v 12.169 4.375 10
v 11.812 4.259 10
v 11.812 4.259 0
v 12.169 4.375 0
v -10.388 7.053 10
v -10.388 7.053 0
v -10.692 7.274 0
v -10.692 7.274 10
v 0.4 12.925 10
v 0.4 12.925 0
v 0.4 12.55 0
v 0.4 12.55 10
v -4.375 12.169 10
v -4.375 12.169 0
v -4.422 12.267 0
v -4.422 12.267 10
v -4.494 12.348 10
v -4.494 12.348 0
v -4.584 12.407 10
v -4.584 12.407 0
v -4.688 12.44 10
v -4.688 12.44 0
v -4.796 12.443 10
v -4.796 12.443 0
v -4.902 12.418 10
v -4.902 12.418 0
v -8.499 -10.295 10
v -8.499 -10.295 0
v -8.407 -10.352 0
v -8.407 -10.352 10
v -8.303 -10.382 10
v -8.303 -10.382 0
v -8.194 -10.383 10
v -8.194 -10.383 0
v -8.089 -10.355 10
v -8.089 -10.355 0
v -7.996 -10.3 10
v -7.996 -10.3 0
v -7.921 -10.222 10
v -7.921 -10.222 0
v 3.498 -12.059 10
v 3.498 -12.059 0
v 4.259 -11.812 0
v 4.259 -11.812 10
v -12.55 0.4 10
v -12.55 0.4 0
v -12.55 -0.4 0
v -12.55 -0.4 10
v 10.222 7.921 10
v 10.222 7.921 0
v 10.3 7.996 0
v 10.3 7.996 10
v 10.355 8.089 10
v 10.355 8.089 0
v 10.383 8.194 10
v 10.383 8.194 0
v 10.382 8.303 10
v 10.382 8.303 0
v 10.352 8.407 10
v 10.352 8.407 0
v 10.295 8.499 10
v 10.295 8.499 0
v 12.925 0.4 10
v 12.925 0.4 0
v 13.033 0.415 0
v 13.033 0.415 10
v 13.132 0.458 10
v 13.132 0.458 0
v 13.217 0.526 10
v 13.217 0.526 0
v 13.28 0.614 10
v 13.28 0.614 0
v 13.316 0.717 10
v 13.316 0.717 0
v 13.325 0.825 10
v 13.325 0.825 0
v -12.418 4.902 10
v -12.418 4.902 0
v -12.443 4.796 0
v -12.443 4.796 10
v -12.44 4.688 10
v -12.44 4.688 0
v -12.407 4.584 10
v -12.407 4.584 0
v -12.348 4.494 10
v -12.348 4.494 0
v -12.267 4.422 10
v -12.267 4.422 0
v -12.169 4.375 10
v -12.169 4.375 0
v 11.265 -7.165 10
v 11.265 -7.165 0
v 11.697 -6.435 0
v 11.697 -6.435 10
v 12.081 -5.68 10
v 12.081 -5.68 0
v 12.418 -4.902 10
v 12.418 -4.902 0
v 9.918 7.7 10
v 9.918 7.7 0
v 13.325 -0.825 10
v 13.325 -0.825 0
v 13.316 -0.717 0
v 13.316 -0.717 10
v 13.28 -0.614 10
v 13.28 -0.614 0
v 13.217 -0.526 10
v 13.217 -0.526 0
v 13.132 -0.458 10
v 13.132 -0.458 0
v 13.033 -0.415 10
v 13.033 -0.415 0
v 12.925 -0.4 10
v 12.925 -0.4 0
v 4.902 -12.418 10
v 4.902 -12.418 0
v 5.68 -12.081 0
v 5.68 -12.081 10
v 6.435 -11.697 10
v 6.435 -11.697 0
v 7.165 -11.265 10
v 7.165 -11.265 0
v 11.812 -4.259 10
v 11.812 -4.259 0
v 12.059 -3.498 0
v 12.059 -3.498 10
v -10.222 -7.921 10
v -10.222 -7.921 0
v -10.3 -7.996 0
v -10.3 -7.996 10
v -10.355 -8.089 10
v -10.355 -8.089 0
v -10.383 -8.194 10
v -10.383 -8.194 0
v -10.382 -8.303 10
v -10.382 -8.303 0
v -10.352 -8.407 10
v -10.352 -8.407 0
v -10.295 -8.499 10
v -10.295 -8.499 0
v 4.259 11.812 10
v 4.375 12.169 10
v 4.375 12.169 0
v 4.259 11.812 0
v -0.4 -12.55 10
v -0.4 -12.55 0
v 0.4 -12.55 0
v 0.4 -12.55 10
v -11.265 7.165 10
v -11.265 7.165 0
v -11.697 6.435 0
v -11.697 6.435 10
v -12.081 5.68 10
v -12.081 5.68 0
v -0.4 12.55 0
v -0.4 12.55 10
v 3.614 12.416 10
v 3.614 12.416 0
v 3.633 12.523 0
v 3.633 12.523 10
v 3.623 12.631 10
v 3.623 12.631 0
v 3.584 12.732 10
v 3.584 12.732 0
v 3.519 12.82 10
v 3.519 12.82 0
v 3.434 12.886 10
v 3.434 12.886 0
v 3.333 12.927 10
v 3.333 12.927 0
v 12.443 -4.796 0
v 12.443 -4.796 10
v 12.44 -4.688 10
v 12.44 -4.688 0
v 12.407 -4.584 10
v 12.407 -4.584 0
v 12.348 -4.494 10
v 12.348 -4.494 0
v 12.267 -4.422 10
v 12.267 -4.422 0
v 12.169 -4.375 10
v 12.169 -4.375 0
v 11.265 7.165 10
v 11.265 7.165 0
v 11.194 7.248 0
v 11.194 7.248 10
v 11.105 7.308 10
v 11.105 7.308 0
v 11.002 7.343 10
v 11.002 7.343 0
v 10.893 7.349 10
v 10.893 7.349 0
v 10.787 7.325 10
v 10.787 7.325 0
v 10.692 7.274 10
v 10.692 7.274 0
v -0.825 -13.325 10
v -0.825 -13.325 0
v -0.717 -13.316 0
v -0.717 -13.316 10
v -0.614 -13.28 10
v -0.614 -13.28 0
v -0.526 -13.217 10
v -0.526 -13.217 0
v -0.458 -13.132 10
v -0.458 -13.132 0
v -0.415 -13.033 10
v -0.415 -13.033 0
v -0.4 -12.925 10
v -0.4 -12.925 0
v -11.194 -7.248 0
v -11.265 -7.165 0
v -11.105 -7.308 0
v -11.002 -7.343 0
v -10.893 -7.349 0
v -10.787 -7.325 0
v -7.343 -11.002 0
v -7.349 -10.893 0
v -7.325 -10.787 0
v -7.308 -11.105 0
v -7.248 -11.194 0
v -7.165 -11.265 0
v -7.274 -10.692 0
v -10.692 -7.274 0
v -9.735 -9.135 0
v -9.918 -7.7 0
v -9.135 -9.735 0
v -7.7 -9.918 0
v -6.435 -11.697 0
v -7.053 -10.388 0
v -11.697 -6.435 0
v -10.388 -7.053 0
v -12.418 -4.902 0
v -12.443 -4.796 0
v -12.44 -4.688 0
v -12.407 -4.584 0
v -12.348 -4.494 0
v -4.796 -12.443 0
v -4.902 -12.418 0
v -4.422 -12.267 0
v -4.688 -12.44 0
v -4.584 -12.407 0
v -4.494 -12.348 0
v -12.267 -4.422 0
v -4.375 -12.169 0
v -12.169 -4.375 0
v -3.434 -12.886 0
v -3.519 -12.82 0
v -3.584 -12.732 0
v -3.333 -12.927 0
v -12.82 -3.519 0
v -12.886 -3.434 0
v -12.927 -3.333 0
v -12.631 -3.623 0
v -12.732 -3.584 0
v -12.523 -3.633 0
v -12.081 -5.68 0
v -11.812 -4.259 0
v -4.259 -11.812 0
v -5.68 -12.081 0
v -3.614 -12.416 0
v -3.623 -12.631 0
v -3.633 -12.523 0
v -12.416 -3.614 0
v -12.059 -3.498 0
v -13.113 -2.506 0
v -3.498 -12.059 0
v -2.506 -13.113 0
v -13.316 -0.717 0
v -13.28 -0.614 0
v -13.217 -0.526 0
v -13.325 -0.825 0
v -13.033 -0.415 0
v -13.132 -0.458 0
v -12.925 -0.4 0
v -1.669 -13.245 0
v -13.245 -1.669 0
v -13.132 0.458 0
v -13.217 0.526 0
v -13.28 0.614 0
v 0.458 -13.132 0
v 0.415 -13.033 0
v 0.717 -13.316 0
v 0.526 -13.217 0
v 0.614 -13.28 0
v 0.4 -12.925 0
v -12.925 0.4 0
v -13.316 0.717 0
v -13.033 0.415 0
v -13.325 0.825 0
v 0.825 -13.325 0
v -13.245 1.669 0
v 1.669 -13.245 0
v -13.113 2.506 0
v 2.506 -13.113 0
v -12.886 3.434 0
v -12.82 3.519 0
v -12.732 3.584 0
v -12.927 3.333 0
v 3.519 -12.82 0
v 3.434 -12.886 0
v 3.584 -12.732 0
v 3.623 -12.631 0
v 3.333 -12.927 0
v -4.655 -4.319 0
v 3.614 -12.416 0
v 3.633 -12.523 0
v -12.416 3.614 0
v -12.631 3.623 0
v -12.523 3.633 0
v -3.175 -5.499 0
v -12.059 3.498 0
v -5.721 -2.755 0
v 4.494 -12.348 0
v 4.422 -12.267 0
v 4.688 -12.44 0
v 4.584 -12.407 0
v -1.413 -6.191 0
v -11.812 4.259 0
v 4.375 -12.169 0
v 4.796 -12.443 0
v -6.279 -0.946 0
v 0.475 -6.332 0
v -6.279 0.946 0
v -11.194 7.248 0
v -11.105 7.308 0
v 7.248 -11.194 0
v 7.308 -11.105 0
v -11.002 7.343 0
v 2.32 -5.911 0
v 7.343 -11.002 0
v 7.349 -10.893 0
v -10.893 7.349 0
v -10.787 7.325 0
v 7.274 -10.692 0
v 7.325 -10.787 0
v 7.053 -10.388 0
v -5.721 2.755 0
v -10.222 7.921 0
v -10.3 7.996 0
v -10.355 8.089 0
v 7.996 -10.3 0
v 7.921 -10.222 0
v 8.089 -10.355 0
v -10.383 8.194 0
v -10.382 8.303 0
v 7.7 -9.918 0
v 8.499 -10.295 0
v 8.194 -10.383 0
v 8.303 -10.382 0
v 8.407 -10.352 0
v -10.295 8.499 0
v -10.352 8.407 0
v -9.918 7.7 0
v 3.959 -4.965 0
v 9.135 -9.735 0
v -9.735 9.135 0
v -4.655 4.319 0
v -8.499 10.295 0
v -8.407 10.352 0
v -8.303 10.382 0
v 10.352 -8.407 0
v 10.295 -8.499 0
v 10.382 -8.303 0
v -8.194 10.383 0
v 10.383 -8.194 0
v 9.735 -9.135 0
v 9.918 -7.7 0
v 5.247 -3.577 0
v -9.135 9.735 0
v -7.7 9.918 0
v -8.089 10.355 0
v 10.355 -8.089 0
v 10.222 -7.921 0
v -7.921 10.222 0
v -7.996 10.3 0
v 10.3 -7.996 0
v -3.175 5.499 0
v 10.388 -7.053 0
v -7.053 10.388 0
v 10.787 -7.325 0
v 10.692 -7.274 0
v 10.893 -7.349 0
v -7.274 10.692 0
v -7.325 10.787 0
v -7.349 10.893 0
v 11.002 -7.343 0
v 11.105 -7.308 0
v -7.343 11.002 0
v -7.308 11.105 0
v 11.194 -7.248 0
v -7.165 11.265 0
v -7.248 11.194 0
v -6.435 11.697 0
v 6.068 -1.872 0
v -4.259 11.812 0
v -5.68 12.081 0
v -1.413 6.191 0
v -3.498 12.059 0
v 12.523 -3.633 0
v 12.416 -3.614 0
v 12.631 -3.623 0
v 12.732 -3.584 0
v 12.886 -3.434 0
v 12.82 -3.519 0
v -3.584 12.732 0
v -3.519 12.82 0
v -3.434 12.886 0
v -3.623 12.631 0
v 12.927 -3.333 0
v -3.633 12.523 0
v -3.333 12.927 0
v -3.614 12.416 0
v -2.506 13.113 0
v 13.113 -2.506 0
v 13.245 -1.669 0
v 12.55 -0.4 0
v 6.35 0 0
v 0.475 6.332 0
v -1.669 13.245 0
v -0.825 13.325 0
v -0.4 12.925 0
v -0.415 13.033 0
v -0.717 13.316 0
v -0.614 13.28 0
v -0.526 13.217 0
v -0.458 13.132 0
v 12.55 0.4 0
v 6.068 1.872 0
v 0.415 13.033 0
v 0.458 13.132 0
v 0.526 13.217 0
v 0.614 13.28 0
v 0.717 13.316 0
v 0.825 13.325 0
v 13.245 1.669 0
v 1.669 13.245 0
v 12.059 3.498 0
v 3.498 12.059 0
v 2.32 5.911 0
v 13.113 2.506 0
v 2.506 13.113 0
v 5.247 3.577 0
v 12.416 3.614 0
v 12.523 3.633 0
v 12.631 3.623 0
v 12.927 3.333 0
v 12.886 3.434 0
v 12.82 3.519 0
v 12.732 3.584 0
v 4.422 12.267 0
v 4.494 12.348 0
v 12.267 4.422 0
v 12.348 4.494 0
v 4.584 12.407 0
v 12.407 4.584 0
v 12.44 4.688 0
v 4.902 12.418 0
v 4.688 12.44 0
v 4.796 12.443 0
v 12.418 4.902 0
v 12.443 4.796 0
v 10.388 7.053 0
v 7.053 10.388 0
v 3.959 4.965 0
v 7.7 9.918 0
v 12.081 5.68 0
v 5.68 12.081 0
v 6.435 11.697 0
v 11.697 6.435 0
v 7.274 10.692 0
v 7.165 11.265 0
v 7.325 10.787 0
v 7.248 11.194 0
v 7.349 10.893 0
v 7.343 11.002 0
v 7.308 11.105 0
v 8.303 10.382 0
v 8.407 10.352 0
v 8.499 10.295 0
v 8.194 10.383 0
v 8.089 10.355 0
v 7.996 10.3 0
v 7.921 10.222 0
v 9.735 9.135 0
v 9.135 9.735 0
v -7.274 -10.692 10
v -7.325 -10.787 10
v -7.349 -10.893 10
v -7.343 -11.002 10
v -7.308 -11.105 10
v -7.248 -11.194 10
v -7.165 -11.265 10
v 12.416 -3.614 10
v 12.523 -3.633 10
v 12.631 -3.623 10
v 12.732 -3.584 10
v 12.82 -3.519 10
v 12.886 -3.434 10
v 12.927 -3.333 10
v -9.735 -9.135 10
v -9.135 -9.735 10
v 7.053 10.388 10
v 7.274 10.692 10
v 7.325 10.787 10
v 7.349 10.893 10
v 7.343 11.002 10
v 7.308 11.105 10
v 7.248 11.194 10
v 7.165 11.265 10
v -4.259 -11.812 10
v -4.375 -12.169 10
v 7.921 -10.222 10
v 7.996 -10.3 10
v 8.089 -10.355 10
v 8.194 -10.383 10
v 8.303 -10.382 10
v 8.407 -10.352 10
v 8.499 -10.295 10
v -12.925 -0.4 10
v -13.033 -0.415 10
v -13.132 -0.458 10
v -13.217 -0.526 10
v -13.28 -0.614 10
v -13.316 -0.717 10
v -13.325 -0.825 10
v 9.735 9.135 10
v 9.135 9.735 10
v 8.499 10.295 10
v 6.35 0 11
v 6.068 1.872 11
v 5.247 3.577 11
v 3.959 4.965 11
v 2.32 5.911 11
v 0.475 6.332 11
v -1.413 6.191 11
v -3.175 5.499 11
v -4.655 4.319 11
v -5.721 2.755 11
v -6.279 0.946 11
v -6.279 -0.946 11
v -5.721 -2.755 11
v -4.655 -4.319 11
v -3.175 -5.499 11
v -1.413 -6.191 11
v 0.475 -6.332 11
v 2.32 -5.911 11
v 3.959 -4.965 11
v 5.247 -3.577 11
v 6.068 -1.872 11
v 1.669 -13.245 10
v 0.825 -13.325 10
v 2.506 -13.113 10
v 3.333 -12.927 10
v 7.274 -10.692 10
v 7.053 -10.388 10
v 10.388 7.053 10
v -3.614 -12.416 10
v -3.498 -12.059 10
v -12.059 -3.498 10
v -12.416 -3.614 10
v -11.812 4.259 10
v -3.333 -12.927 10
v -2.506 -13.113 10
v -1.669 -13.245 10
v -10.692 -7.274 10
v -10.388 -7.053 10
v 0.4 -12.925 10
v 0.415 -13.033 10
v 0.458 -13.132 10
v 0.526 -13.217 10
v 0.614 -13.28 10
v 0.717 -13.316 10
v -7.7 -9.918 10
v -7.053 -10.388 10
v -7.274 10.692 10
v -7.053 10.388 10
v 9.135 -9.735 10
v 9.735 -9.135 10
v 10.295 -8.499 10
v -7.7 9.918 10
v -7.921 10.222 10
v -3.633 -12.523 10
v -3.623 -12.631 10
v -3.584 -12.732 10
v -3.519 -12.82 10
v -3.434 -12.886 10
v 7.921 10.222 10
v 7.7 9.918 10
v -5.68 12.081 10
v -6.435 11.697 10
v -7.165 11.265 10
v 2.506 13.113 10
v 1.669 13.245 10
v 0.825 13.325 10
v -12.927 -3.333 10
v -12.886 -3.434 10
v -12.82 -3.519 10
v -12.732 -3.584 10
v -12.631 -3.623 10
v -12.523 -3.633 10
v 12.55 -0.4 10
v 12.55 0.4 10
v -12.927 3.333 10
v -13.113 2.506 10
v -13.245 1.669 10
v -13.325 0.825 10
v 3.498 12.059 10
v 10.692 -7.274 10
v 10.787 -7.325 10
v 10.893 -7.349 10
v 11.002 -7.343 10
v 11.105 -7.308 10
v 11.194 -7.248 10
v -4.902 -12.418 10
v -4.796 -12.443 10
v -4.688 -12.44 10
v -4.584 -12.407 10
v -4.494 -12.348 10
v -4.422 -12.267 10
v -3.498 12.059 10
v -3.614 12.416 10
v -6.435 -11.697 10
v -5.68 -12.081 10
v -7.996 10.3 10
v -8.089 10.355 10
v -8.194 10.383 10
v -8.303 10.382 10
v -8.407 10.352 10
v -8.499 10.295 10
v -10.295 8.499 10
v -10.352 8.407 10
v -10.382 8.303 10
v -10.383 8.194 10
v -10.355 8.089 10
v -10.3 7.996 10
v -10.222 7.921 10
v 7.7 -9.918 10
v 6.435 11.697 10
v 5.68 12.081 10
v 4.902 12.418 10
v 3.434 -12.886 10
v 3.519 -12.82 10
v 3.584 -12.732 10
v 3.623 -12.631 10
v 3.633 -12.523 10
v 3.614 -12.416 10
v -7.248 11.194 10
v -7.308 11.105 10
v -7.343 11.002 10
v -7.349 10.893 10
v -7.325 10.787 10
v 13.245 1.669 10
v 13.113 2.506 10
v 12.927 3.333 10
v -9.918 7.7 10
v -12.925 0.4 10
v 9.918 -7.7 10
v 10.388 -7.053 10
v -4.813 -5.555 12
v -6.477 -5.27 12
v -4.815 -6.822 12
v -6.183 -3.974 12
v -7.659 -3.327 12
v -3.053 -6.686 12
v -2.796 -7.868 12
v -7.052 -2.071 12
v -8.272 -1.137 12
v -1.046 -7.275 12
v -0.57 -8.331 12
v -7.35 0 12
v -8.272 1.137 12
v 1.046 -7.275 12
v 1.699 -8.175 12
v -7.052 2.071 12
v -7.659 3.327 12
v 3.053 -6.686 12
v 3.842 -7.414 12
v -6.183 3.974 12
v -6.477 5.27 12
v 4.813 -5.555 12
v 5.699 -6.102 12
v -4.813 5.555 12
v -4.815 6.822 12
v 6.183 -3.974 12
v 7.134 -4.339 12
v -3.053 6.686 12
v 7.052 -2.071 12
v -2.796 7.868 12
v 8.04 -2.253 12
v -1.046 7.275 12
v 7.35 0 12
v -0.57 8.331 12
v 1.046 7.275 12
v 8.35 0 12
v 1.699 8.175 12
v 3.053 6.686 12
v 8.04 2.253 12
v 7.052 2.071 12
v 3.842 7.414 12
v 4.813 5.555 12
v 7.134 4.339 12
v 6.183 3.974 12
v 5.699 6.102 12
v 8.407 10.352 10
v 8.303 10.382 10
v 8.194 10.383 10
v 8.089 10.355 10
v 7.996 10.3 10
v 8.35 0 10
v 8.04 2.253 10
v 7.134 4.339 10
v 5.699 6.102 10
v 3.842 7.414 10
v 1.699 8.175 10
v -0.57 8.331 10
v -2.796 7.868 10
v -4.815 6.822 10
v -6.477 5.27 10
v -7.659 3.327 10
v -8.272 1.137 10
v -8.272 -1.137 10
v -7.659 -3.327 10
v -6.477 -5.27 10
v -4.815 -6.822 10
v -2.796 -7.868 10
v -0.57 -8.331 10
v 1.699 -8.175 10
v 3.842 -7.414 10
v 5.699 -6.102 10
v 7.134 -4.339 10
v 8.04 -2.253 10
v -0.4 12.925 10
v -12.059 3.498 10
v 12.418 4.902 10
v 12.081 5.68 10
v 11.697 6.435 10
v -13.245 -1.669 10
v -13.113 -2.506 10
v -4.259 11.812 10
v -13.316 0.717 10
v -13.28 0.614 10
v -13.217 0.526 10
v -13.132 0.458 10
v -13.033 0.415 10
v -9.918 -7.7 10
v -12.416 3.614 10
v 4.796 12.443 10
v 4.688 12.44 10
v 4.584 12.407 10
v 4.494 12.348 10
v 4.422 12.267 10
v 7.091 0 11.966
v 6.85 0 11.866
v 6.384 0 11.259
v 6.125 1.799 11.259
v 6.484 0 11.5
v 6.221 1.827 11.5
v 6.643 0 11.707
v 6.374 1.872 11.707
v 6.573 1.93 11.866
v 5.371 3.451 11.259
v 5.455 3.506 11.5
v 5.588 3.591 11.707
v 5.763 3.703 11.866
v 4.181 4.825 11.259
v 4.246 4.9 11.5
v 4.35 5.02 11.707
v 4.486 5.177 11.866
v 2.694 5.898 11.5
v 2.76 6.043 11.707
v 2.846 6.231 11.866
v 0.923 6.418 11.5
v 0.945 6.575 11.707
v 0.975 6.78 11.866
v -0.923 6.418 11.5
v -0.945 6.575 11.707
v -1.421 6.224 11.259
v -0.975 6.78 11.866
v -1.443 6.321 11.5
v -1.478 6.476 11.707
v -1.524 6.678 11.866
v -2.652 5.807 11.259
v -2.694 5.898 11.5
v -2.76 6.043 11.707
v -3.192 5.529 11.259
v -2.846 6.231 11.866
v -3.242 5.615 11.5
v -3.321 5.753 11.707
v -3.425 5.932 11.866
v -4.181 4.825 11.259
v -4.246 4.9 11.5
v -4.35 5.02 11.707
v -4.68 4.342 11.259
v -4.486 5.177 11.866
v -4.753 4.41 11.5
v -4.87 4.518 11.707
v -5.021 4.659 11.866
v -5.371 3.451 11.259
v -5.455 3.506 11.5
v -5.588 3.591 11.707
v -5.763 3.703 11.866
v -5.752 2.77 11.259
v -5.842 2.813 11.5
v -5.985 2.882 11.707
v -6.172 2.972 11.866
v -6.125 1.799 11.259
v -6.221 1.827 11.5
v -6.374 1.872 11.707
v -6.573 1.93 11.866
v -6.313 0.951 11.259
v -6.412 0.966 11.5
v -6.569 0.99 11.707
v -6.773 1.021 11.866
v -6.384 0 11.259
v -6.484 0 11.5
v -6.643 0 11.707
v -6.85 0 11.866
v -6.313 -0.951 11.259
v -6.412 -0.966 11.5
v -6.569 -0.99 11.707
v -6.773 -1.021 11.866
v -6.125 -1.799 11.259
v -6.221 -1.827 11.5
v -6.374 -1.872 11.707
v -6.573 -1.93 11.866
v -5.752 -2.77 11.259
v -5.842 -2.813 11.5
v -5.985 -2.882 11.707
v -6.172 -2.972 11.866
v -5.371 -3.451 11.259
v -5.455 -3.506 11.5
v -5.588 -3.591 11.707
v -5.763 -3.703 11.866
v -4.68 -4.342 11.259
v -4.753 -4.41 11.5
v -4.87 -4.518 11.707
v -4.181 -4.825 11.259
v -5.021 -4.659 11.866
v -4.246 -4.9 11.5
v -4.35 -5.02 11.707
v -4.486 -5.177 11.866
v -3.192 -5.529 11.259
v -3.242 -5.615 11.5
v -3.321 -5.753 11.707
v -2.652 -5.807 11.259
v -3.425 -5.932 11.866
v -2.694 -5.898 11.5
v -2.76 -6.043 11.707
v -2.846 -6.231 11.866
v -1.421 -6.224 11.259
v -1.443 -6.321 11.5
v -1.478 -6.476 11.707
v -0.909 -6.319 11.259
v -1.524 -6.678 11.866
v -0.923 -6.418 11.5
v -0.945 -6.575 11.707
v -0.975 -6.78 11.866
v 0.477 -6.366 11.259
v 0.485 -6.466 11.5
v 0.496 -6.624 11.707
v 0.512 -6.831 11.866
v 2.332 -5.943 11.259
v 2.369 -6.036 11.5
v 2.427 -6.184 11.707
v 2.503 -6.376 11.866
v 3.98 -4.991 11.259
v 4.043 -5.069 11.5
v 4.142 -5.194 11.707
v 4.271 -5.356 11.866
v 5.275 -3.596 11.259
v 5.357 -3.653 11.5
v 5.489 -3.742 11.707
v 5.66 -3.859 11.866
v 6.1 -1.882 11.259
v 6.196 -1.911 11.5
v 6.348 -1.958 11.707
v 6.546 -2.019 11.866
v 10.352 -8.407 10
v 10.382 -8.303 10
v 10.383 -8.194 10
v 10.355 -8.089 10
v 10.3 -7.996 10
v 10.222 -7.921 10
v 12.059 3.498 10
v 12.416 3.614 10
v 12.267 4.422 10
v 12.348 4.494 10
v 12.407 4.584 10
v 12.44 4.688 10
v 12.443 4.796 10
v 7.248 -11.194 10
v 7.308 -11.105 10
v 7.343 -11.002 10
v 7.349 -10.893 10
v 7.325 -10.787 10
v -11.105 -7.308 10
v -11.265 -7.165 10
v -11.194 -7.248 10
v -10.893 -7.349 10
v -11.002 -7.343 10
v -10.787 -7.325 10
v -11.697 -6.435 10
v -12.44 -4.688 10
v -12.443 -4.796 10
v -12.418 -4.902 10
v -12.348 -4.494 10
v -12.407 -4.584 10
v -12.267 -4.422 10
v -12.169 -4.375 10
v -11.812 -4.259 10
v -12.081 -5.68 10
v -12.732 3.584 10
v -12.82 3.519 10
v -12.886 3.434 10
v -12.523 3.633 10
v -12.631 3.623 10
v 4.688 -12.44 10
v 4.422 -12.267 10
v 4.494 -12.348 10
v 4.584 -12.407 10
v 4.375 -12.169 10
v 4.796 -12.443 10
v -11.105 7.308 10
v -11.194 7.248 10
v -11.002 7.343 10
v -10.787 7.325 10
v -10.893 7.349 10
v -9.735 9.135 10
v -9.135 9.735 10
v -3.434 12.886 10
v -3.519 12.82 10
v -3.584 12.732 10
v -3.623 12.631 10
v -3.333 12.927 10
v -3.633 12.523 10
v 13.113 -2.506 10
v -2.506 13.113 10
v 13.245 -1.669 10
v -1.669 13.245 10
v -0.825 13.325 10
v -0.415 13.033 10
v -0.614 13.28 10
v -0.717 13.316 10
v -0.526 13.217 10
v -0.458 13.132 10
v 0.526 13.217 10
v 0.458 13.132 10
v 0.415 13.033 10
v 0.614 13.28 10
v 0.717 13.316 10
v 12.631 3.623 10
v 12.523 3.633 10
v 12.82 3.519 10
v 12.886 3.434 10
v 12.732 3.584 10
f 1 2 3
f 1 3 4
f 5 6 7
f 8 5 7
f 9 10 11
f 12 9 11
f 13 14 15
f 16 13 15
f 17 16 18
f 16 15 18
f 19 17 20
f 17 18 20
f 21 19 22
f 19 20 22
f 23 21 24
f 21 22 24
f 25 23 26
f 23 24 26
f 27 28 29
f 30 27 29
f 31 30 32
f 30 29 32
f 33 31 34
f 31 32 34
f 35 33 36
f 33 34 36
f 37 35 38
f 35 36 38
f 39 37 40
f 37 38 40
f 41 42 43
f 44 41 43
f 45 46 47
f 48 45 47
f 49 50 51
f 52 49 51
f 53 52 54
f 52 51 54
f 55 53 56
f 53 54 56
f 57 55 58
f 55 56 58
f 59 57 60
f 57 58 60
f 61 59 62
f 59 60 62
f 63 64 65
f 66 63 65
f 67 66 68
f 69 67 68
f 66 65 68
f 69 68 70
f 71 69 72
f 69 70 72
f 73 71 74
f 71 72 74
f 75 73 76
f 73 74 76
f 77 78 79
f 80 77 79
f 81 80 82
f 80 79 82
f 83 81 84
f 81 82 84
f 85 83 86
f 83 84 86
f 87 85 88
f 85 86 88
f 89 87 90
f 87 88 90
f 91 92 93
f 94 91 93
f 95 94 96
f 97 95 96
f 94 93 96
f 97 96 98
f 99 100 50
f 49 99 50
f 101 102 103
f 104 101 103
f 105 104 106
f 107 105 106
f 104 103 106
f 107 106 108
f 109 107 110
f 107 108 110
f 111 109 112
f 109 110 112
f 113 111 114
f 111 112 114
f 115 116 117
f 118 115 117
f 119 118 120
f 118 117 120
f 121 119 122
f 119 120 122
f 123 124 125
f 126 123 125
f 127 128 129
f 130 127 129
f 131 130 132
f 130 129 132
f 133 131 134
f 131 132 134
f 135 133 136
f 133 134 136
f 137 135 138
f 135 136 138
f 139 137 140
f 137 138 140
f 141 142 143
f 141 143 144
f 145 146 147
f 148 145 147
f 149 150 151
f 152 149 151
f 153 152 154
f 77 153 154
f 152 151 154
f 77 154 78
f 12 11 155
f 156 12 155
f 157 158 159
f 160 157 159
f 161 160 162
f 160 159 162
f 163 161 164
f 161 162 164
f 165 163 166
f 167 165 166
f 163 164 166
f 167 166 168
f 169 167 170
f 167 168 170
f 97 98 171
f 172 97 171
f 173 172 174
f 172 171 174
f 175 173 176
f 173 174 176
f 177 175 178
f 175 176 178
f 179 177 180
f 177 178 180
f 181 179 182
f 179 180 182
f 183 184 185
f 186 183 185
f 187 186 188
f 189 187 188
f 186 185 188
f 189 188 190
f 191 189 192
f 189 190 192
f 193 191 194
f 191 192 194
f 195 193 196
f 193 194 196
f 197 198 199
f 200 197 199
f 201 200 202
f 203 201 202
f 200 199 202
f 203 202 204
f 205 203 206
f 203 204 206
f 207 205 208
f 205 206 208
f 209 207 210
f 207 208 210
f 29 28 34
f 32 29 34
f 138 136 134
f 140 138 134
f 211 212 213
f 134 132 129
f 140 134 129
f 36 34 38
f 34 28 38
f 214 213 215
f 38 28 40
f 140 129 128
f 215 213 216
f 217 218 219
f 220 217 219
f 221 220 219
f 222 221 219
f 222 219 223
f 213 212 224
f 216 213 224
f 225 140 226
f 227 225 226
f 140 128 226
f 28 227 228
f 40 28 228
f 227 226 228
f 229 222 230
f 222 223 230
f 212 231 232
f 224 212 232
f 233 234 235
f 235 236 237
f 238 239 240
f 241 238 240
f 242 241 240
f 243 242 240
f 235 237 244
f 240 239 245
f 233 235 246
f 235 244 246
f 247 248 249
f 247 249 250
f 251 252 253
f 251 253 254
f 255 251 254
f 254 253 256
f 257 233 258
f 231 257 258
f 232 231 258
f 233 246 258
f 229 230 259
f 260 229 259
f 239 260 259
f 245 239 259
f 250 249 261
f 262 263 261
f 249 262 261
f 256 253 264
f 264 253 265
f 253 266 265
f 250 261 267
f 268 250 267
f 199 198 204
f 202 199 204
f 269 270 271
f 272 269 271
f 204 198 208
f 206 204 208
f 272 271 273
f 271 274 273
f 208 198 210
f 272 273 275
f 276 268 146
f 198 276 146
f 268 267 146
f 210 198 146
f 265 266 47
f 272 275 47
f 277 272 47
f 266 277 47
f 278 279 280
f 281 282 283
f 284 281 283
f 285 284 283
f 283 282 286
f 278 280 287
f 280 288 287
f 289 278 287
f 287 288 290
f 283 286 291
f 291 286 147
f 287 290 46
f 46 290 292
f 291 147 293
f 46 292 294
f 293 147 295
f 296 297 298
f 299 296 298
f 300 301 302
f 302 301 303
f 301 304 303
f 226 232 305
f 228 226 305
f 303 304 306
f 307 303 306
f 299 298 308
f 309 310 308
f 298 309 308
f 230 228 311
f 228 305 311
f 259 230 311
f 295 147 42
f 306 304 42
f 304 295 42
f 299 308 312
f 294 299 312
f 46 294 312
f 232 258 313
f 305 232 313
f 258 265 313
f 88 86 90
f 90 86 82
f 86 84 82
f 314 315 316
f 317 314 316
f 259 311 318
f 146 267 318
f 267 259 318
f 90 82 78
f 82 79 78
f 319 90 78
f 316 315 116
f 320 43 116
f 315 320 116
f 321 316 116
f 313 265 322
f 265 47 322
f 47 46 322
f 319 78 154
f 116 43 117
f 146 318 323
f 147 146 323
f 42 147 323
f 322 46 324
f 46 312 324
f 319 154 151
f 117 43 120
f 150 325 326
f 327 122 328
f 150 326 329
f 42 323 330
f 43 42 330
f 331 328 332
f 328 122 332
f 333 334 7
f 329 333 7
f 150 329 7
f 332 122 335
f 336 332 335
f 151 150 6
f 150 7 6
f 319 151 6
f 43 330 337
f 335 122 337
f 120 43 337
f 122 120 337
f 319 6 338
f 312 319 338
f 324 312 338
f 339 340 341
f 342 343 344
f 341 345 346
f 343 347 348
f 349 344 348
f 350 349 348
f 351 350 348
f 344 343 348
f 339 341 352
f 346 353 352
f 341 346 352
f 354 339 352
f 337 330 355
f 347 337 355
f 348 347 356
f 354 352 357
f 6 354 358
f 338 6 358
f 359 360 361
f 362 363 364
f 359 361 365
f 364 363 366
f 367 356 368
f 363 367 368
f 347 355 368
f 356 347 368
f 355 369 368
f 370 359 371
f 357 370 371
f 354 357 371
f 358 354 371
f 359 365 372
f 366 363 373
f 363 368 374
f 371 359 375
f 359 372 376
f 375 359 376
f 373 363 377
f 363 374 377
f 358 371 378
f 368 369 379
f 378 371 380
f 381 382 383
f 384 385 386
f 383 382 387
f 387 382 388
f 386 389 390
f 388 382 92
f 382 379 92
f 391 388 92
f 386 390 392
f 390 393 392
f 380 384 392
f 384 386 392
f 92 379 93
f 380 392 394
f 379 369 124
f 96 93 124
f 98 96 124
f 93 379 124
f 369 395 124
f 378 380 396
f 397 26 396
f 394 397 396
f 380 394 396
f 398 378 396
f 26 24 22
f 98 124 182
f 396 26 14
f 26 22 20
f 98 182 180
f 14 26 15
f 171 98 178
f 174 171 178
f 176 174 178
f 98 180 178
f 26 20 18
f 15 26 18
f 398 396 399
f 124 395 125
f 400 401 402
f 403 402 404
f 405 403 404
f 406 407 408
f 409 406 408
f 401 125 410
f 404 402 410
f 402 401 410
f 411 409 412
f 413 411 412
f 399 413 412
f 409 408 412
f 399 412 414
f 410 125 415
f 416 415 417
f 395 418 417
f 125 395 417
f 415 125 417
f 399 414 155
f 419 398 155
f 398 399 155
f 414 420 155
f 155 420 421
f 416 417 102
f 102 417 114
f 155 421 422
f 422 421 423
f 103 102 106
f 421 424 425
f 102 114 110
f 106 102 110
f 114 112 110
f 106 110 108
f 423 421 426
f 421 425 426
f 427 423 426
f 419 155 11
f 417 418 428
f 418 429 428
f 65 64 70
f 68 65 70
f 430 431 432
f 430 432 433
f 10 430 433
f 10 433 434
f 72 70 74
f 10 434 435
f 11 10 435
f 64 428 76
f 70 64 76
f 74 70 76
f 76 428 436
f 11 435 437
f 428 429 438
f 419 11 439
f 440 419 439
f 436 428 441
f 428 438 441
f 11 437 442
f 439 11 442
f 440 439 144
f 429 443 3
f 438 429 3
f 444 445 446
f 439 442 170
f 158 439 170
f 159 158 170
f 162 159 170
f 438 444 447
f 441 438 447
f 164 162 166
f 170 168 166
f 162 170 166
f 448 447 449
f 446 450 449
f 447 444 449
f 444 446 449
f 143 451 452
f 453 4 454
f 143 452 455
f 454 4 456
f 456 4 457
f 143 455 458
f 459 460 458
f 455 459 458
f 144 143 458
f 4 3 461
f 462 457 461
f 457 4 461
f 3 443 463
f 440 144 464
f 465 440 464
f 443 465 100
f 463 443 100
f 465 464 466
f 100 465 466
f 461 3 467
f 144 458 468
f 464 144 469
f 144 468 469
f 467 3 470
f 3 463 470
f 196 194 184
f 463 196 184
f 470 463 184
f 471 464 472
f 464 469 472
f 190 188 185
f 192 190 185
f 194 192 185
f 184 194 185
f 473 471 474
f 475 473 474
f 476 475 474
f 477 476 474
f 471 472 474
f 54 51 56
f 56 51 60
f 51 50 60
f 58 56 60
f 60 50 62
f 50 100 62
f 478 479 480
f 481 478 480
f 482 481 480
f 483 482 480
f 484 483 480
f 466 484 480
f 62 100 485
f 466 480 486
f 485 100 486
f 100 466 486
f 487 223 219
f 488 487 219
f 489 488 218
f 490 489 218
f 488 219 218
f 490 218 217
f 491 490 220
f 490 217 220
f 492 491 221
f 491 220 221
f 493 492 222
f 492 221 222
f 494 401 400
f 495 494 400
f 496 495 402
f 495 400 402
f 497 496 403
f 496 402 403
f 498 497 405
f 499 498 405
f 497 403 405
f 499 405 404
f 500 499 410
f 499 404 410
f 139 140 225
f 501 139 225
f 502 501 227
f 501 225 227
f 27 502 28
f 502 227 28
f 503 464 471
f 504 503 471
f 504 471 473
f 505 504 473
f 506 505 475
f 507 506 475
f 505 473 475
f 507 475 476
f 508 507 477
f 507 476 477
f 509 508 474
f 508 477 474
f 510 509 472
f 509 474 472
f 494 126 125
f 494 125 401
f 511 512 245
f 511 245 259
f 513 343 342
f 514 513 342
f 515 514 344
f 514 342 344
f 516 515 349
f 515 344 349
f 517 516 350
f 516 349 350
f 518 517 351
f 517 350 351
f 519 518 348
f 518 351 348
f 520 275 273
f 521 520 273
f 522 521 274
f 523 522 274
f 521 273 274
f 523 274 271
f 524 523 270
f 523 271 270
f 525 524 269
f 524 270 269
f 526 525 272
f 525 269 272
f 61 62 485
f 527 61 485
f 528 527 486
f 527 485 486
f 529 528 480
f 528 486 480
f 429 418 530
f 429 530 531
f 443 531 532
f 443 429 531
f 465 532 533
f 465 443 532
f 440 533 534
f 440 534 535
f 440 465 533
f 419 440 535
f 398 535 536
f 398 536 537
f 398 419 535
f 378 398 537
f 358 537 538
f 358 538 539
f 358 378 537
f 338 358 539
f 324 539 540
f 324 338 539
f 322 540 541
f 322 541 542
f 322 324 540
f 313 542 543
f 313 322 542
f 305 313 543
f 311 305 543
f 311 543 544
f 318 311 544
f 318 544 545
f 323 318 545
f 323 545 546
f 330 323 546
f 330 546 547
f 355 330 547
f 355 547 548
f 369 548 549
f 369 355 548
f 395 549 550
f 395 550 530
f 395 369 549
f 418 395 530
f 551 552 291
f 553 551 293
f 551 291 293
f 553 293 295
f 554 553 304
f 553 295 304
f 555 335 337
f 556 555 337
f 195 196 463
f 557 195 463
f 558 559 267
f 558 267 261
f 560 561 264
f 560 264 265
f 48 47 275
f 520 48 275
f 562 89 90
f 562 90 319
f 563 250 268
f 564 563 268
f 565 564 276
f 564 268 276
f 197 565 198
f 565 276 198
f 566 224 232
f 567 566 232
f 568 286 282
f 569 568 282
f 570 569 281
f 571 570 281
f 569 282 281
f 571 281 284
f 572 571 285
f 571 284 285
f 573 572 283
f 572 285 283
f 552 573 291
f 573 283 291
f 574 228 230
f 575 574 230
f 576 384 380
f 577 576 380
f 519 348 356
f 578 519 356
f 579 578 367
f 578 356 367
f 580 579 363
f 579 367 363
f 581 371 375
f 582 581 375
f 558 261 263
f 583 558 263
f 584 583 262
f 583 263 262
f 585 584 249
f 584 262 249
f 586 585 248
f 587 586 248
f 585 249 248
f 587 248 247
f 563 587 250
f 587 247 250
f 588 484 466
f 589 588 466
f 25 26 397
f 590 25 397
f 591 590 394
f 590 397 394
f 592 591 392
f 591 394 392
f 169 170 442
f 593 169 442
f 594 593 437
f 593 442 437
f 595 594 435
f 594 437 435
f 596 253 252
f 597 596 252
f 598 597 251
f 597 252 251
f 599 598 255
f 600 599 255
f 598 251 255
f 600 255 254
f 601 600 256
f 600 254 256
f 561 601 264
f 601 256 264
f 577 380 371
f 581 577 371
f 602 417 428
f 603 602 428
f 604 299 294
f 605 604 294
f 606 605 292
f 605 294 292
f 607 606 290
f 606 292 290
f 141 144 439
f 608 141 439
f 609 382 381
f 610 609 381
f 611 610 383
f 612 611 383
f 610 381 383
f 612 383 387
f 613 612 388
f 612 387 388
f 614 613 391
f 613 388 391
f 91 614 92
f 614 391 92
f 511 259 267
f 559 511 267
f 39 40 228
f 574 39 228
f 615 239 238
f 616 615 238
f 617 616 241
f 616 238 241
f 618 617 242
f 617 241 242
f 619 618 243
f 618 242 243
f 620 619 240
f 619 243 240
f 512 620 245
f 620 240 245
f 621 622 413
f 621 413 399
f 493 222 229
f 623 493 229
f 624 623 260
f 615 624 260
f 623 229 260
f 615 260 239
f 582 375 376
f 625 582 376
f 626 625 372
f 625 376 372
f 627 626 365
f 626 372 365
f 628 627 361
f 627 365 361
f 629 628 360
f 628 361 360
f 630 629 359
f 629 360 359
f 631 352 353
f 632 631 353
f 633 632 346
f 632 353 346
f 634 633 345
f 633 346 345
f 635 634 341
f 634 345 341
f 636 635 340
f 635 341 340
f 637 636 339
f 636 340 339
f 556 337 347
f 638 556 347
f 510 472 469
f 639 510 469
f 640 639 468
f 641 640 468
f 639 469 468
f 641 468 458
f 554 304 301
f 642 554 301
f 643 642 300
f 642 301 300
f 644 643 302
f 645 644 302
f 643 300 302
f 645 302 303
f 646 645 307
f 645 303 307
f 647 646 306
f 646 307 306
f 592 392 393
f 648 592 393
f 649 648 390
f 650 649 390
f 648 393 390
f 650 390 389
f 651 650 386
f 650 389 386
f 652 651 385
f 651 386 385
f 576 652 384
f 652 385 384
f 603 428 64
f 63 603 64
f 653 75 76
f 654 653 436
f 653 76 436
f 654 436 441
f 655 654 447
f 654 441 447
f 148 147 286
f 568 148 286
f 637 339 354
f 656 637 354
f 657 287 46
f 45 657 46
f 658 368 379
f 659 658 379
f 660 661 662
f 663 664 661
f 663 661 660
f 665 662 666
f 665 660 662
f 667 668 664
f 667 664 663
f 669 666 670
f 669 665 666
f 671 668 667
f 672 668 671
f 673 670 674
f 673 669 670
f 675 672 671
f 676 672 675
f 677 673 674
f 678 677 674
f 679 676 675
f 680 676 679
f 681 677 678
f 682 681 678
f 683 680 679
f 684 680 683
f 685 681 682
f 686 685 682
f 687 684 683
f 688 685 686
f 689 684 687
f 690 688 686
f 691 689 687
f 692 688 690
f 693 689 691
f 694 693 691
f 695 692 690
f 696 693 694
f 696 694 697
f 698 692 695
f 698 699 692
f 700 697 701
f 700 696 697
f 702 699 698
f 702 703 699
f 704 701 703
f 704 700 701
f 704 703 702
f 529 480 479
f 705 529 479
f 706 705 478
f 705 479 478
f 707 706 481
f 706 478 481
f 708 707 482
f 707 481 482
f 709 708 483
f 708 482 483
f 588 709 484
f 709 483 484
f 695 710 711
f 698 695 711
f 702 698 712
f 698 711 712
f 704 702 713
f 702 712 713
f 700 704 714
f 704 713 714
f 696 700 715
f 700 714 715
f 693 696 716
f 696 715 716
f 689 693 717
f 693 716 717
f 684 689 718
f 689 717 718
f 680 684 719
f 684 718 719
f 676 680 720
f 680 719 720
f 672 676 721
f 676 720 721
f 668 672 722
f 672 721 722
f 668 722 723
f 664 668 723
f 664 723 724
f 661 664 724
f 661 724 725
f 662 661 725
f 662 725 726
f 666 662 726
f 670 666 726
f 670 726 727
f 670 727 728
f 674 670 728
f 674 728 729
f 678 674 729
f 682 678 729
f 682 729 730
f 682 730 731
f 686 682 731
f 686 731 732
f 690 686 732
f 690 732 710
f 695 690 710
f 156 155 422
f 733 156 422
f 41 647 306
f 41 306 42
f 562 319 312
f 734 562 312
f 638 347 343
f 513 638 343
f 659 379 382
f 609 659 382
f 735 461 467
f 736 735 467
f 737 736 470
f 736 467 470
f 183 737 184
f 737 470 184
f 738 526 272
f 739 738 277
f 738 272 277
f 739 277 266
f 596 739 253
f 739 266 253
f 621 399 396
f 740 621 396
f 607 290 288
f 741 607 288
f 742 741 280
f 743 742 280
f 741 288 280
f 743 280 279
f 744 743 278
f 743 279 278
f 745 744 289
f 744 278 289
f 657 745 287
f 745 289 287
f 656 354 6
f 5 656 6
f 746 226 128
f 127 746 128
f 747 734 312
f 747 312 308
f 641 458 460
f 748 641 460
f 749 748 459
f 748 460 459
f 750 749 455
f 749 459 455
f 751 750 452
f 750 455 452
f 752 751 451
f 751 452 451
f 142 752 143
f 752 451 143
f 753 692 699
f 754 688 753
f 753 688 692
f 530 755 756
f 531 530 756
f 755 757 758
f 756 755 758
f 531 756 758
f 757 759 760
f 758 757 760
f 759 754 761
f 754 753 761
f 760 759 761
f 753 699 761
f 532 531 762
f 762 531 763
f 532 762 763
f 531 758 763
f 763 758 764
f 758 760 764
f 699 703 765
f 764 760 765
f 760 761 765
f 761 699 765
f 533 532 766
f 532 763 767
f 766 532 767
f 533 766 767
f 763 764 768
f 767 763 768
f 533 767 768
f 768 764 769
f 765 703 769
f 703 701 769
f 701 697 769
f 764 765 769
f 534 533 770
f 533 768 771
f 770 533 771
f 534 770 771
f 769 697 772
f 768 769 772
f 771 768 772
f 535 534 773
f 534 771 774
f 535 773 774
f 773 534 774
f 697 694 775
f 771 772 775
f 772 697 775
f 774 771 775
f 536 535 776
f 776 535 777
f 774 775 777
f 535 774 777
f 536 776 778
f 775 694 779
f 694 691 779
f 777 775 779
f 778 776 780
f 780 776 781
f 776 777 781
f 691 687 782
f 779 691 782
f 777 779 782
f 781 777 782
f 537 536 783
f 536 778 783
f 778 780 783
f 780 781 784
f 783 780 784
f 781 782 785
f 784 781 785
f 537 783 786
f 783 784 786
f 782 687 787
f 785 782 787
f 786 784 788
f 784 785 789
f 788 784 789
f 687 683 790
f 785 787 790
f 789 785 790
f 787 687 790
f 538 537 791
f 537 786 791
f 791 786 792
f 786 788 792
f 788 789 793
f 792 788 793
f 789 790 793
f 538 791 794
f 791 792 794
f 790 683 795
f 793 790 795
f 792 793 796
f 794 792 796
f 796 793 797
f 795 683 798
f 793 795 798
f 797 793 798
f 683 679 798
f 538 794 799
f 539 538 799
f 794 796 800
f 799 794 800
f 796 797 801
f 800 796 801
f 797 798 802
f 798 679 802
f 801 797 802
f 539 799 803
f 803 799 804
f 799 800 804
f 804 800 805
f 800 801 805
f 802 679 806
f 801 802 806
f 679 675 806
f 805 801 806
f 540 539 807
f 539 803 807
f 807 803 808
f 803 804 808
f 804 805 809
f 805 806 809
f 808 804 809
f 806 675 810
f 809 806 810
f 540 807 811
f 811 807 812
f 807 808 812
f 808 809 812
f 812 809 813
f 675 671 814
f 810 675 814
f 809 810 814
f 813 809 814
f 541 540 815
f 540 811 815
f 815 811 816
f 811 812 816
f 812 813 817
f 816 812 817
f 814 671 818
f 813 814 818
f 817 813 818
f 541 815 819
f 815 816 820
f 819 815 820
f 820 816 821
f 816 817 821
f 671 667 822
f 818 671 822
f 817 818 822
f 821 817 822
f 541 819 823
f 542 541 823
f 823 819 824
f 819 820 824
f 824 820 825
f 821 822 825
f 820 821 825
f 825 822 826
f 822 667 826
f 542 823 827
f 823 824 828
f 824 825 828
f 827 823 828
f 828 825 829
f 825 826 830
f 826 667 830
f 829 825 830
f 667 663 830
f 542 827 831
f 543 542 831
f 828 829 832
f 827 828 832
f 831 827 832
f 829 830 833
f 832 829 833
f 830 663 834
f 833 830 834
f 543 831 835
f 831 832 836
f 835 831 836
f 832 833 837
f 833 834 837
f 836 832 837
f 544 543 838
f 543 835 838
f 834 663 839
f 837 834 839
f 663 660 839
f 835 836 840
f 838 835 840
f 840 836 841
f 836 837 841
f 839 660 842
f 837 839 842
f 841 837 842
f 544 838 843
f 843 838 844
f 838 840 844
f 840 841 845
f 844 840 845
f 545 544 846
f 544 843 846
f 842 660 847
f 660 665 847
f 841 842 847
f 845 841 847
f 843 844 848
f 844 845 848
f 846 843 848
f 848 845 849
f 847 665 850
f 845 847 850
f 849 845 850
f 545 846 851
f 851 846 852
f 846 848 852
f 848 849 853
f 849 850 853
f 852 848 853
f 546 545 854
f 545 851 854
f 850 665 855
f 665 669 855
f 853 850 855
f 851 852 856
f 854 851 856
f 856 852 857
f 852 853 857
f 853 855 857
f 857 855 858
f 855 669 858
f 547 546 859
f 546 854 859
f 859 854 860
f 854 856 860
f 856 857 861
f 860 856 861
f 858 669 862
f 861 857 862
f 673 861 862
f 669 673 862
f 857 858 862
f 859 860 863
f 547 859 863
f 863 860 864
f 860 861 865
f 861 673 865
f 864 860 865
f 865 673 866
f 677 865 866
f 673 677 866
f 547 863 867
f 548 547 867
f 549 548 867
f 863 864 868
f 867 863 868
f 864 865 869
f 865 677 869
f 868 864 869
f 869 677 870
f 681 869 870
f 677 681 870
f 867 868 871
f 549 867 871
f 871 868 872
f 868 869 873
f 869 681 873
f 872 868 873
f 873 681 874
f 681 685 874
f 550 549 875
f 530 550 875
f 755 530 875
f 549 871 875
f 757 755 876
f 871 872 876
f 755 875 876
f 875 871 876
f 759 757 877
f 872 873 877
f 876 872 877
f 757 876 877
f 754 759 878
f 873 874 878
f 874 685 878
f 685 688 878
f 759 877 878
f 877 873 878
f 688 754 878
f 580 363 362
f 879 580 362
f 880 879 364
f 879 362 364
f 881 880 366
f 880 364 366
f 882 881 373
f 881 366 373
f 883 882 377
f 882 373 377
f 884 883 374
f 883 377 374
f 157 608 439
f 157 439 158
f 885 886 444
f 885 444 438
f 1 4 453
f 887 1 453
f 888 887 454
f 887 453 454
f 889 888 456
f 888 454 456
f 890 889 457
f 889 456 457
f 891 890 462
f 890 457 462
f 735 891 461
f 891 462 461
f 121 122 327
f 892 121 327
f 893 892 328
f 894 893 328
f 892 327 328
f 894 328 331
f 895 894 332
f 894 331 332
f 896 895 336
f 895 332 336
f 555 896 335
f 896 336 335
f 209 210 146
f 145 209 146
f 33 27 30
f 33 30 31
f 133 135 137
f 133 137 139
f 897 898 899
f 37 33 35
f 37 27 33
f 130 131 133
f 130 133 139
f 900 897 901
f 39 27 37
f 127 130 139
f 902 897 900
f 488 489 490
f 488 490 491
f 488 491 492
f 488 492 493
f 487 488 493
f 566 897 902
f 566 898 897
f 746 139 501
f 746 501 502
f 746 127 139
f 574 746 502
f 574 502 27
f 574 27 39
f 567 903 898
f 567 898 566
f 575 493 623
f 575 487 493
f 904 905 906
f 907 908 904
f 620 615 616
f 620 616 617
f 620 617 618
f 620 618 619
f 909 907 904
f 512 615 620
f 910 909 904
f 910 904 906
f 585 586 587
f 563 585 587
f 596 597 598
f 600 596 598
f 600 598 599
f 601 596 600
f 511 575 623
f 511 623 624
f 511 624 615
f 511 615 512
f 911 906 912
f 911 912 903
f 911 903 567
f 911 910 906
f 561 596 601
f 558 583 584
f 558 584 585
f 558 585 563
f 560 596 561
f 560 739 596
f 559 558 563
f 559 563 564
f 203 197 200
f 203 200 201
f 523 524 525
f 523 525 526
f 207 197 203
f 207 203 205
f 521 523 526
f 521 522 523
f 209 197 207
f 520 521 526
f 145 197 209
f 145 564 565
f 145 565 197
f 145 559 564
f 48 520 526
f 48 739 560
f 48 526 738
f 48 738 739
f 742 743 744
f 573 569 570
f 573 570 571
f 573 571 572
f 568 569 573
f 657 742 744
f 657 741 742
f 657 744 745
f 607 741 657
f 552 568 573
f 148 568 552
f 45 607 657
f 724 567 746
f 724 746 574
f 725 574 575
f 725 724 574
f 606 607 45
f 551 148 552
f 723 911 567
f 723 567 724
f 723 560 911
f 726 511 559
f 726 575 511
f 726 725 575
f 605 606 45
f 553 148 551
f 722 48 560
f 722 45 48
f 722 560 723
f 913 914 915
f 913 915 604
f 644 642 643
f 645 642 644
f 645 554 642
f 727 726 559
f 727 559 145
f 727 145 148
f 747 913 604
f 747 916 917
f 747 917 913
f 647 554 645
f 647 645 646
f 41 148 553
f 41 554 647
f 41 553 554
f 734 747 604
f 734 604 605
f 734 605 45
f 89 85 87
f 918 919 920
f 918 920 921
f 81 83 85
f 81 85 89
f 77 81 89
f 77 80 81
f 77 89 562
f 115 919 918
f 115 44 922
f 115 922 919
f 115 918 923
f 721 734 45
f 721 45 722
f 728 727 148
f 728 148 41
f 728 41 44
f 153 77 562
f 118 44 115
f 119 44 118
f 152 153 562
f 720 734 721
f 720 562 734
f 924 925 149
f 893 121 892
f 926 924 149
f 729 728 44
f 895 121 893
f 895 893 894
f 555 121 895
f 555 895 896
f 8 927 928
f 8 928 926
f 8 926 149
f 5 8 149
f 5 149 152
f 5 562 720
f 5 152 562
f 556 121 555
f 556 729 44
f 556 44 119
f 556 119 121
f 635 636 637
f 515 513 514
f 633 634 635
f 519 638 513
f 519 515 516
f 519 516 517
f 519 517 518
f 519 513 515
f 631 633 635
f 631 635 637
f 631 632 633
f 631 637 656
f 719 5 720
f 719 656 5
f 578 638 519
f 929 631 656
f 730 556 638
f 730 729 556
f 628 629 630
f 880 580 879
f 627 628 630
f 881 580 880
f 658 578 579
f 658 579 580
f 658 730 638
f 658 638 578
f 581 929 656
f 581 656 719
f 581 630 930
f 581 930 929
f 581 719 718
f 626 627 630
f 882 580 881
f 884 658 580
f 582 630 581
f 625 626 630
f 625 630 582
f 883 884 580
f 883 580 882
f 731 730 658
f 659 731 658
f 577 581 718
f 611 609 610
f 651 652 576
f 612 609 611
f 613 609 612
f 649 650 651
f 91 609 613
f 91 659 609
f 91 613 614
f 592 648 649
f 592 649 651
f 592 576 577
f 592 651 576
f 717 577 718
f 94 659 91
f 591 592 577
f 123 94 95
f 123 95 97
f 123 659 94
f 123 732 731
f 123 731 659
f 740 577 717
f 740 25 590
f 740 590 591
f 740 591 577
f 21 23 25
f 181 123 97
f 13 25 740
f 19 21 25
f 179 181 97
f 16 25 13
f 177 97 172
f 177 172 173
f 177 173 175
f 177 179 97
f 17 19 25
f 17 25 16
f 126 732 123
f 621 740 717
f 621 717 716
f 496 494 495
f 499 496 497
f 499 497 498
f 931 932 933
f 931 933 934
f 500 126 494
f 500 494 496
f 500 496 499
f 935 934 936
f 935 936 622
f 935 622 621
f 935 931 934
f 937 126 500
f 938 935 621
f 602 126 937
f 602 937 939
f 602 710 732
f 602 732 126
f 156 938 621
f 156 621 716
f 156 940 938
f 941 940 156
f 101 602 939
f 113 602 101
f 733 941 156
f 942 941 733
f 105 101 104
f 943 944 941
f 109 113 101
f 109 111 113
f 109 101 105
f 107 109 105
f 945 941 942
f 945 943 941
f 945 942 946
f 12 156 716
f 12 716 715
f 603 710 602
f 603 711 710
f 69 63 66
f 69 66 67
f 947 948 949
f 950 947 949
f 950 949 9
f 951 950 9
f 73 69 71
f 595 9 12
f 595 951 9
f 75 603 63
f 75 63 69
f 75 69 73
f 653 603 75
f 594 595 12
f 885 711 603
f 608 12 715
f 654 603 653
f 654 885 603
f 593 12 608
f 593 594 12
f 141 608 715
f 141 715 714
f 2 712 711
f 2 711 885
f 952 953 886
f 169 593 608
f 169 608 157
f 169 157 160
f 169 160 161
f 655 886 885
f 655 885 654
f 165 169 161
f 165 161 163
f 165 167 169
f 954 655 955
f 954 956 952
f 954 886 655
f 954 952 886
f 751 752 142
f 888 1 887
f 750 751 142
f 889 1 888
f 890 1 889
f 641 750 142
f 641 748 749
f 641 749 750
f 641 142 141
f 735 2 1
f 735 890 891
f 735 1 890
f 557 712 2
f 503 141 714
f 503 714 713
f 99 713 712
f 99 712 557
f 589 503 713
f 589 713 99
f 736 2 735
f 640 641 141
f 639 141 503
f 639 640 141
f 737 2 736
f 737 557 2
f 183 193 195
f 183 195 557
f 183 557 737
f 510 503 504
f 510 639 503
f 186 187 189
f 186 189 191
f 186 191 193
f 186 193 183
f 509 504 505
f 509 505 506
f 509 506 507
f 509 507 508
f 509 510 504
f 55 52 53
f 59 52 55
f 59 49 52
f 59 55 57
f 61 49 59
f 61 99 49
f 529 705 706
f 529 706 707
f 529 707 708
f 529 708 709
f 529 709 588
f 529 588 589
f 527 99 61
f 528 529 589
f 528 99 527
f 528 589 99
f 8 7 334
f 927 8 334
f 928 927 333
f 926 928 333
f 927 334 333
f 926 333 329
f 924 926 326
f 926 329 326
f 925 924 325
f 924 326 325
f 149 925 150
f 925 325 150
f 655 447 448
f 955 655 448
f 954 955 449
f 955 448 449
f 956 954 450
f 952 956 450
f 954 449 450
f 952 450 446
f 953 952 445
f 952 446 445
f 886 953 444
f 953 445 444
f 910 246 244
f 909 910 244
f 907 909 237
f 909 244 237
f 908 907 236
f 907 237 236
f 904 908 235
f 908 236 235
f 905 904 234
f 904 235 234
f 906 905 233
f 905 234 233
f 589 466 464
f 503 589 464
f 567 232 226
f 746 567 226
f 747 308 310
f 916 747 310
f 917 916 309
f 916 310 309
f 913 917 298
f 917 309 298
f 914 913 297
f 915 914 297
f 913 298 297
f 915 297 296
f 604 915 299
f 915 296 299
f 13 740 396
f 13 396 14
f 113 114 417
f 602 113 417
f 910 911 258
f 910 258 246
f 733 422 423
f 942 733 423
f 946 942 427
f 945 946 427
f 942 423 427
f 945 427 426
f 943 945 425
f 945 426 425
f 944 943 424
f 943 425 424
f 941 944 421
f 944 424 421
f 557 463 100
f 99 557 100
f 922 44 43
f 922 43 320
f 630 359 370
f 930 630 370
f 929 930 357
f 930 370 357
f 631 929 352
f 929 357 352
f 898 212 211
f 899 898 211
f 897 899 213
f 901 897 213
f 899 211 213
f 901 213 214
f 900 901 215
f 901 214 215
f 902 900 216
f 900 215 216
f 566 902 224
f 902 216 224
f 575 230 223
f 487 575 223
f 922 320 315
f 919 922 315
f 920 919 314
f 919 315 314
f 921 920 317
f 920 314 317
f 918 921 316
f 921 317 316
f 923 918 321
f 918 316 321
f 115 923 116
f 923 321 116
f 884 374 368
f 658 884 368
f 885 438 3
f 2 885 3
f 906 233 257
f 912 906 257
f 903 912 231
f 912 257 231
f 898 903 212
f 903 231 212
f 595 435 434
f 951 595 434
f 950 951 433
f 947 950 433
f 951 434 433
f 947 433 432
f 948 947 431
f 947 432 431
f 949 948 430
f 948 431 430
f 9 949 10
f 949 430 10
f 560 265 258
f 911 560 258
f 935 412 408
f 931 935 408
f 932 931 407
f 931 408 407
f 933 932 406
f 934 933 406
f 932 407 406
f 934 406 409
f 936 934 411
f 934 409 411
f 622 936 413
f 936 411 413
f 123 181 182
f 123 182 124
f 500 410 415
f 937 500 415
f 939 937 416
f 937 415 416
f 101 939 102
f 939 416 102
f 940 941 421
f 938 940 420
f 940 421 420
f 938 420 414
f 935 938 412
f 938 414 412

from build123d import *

# Parameters (mm, degrees)
F0_R     = 8.35
F0_R_2   = 6.35
F1_DEPTH = 12
F2_DEPTH = 10
F3_R     = 1


with BuildPart() as f1:
    # F0 (on Top) → F1 (new body)
    with BuildSketch(Plane.XY):
        Circle(F0_R)
        Circle(F0_R_2, mode=Mode.SUBTRACT)
    extrude(amount=F1_DEPTH)

    # F0 (on Top) → F2 (join)
    with BuildSketch(Plane.XY):
        with BuildLine():
            ThreePointArc((12.925266, 0.4), (13.216714, 0.526033), (13.324502, 0.82471))
            ThreePointArc((13.324502, 0.82471), (13.185639, 2.0884), (12.927204, 3.333151))
            ThreePointArc((12.927204, 3.333151), (12.732395, 3.583902), (12.416265, 3.613704))
            Line((12.416265, 3.613704), (12.059366, 3.497741))
            Line((12.059366, 3.497741), (11.812152, 4.258586))
            Line((11.812152, 4.258586), (12.169052, 4.374549))
            ThreePointArc((12.169052, 4.374549), (12.407289, 4.584476), (12.417505, 4.901844))
            ThreePointArc((12.417505, 4.901844), (11.894937, 6.060773), (11.264501, 7.164741))
            ThreePointArc((11.264501, 7.164741), (11.001741, 7.34302), (10.691874, 7.273674))
            Line((10.691874, 7.273674), (10.388277, 7.053098))
            Line((10.388277, 7.053098), (9.918049, 7.700312))
            Line((9.918049, 7.700312), (10.221646, 7.920888))
            ThreePointArc((10.221646, 7.920888), (10.383352, 8.194159), (10.294996, 8.499151))
            ThreePointArc((10.294996, 8.499151), (9.439876, 9.439876), (8.499151, 10.294996))
            ThreePointArc((8.499151, 10.294996), (8.194159, 10.383352), (7.920888, 10.221646))
            Line((7.920888, 10.221646), (7.700312, 9.918049))
            Line((7.700312, 9.918049), (7.053098, 10.388277))
            Line((7.053098, 10.388277), (7.273674, 10.691874))
            ThreePointArc((7.273674, 10.691874), (7.34302, 11.001741), (7.164741, 11.264501))
            ThreePointArc((7.164741, 11.264501), (6.060773, 11.894937), (4.901844, 12.417505))
            ThreePointArc((4.901844, 12.417505), (4.584476, 12.407289), (4.374549, 12.169052))
            Line((4.374549, 12.169052), (4.258586, 11.812152))
            Line((4.258586, 11.812152), (3.497741, 12.059366))
            Line((3.497741, 12.059366), (3.613704, 12.416265))
            ThreePointArc((3.613704, 12.416265), (3.583902, 12.732395), (3.333151, 12.927204))
            ThreePointArc((3.333151, 12.927204), (2.0884, 13.185639), (0.82471, 13.324502))
            ThreePointArc((0.82471, 13.324502), (0.526033, 13.216714), (0.4, 12.925266))
            Line((0.4, 12.925266), (0.4, 12.55))
            Line((0.4, 12.55), (-0.4, 12.55))
            Line((-0.4, 12.55), (-0.4, 12.925266))
            ThreePointArc((-0.4, 12.925266), (-0.526033, 13.216714), (-0.82471, 13.324502))
            ThreePointArc((-0.82471, 13.324502), (-2.0884, 13.185639), (-3.333151, 12.927204))
            ThreePointArc((-3.333151, 12.927204), (-3.583902, 12.732395), (-3.613704, 12.416265))
            Line((-3.613704, 12.416265), (-3.497741, 12.059366))
            Line((-3.497741, 12.059366), (-4.258586, 11.812152))
            Line((-4.258586, 11.812152), (-4.374549, 12.169052))
            ThreePointArc((-4.374549, 12.169052), (-4.584476, 12.407289), (-4.901844, 12.417505))
            ThreePointArc((-4.901844, 12.417505), (-6.060773, 11.894937), (-7.164741, 11.264501))
            ThreePointArc((-7.164741, 11.264501), (-7.34302, 11.001741), (-7.273674, 10.691874))
            Line((-7.273674, 10.691874), (-7.053098, 10.388277))
            Line((-7.053098, 10.388277), (-7.700312, 9.918049))
            Line((-7.700312, 9.918049), (-7.920888, 10.221646))
            ThreePointArc((-7.920888, 10.221646), (-8.194159, 10.383352), (-8.499151, 10.294996))
            ThreePointArc((-8.499151, 10.294996), (-9.439876, 9.439876), (-10.294996, 8.499151))
            ThreePointArc((-10.294996, 8.499151), (-10.383352, 8.194159), (-10.221646, 7.920888))
            Line((-10.221646, 7.920888), (-9.918049, 7.700312))
            Line((-9.918049, 7.700312), (-10.388277, 7.053098))
            Line((-10.388277, 7.053098), (-10.691874, 7.273674))
            ThreePointArc((-10.691874, 7.273674), (-11.001741, 7.34302), (-11.264501, 7.164741))
            ThreePointArc((-11.264501, 7.164741), (-11.894937, 6.060773), (-12.417505, 4.901844))
            ThreePointArc((-12.417505, 4.901844), (-12.407289, 4.584476), (-12.169052, 4.374549))
            Line((-12.169052, 4.374549), (-11.812152, 4.258586))
            Line((-11.812152, 4.258586), (-12.059366, 3.497741))
            Line((-12.059366, 3.497741), (-12.416265, 3.613704))
            ThreePointArc((-12.416265, 3.613704), (-12.732395, 3.583902), (-12.927204, 3.333151))
            ThreePointArc((-12.927204, 3.333151), (-13.185639, 2.0884), (-13.324502, 0.82471))
            ThreePointArc((-13.324502, 0.82471), (-13.216714, 0.526033), (-12.925266, 0.4))
            Line((-12.925266, 0.4), (-12.55, 0.4))
            Line((-12.55, 0.4), (-12.55, -0.4))
            Line((-12.55, -0.4), (-12.925266, -0.4))
            ThreePointArc((-12.925266, -0.4), (-13.216714, -0.526033), (-13.324502, -0.82471))
            ThreePointArc((-13.324502, -0.82471), (-13.185639, -2.0884), (-12.927204, -3.333151))
            ThreePointArc((-12.927204, -3.333151), (-12.732395, -3.583902), (-12.416265, -3.613704))
            Line((-12.416265, -3.613704), (-12.059366, -3.497741))
            Line((-12.059366, -3.497741), (-11.812152, -4.258586))
            Line((-11.812152, -4.258586), (-12.169052, -4.374549))
            ThreePointArc((-12.169052, -4.374549), (-12.407289, -4.584476), (-12.417505, -4.901844))
            ThreePointArc((-12.417505, -4.901844), (-11.894937, -6.060773), (-11.264501, -7.164741))
            ThreePointArc((-11.264501, -7.164741), (-11.001741, -7.34302), (-10.691874, -7.273674))
            Line((-10.691874, -7.273674), (-10.388277, -7.053098))
            Line((-10.388277, -7.053098), (-9.918049, -7.700312))
            Line((-9.918049, -7.700312), (-10.221646, -7.920888))
            ThreePointArc((-10.221646, -7.920888), (-10.383352, -8.194159), (-10.294996, -8.499151))
            ThreePointArc((-10.294996, -8.499151), (-9.439876, -9.439876), (-8.499151, -10.294996))
            ThreePointArc((-8.499151, -10.294996), (-8.194159, -10.383352), (-7.920888, -10.221646))
            Line((-7.920888, -10.221646), (-7.700312, -9.918049))
            Line((-7.700312, -9.918049), (-7.053098, -10.388277))
            Line((-7.053098, -10.388277), (-7.273674, -10.691874))
            ThreePointArc((-7.273674, -10.691874), (-7.34302, -11.001741), (-7.164741, -11.264501))
            ThreePointArc((-7.164741, -11.264501), (-6.060773, -11.894937), (-4.901844, -12.417505))
            ThreePointArc((-4.901844, -12.417505), (-4.584476, -12.407289), (-4.374549, -12.169052))
            Line((-4.374549, -12.169052), (-4.258586, -11.812152))
            Line((-4.258586, -11.812152), (-3.497741, -12.059366))
            Line((-3.497741, -12.059366), (-3.613704, -12.416265))
            ThreePointArc((-3.613704, -12.416265), (-3.583902, -12.732395), (-3.333151, -12.927204))
            ThreePointArc((-3.333151, -12.927204), (-2.0884, -13.185639), (-0.82471, -13.324502))
            ThreePointArc((-0.82471, -13.324502), (-0.526033, -13.216714), (-0.4, -12.925266))
            Line((-0.4, -12.925266), (-0.4, -12.55))
            Line((-0.4, -12.55), (0.4, -12.55))
            Line((0.4, -12.55), (0.4, -12.925266))
            ThreePointArc((0.4, -12.925266), (0.526033, -13.216714), (0.82471, -13.324502))
            ThreePointArc((0.82471, -13.324502), (2.0884, -13.185639), (3.333151, -12.927204))
            ThreePointArc((3.333151, -12.927204), (3.583902, -12.732395), (3.613704, -12.416265))
            Line((3.613704, -12.416265), (3.497741, -12.059366))
            Line((3.497741, -12.059366), (4.258586, -11.812152))
            Line((4.258586, -11.812152), (4.374549, -12.169052))
            ThreePointArc((4.374549, -12.169052), (4.584476, -12.407289), (4.901844, -12.417505))
            ThreePointArc((4.901844, -12.417505), (6.060773, -11.894937), (7.164741, -11.264501))
            ThreePointArc((7.164741, -11.264501), (7.34302, -11.001741), (7.273674, -10.691874))
            Line((7.273674, -10.691874), (7.053098, -10.388277))
            Line((7.053098, -10.388277), (7.700312, -9.918049))
            Line((7.700312, -9.918049), (7.920888, -10.221646))
            ThreePointArc((7.920888, -10.221646), (8.194159, -10.383352), (8.499151, -10.294996))
            ThreePointArc((8.499151, -10.294996), (9.439876, -9.439876), (10.294996, -8.499151))
            ThreePointArc((10.294996, -8.499151), (10.383352, -8.194159), (10.221646, -7.920888))
            Line((10.221646, -7.920888), (9.918049, -7.700312))
            Line((9.918049, -7.700312), (10.388277, -7.053098))
            Line((10.388277, -7.053098), (10.691874, -7.273674))
            ThreePointArc((10.691874, -7.273674), (11.001741, -7.34302), (11.264501, -7.164741))
            ThreePointArc((11.264501, -7.164741), (11.894937, -6.060773), (12.417505, -4.901844))
            ThreePointArc((12.417505, -4.901844), (12.407289, -4.584476), (12.169052, -4.374549))
            Line((12.169052, -4.374549), (11.812152, -4.258586))
            Line((11.812152, -4.258586), (12.059366, -3.497741))
            Line((12.059366, -3.497741), (12.416265, -3.613704))
            ThreePointArc((12.416265, -3.613704), (12.732395, -3.583902), (12.927204, -3.333151))
            ThreePointArc((12.927204, -3.333151), (13.185639, -2.0884), (13.324502, -0.82471))
            ThreePointArc((13.324502, -0.82471), (13.216714, -0.526033), (12.925266, -0.4))
            Line((12.925266, -0.4), (12.55, -0.4))
            Line((12.55, -0.4), (12.55, 0.4))
            Line((12.55, 0.4), (12.925266, 0.4))
        make_face()
        Circle(F0_R, mode=Mode.SUBTRACT)
    extrude(amount=F2_DEPTH)

    # F3
    f3_edges = [f1.edges().sort_by_distance(p)[0] for p in [
        (-6.35, 0, 12),
    ]]
    fillet(f3_edges, radius=F3_R)


solid = f1.part
